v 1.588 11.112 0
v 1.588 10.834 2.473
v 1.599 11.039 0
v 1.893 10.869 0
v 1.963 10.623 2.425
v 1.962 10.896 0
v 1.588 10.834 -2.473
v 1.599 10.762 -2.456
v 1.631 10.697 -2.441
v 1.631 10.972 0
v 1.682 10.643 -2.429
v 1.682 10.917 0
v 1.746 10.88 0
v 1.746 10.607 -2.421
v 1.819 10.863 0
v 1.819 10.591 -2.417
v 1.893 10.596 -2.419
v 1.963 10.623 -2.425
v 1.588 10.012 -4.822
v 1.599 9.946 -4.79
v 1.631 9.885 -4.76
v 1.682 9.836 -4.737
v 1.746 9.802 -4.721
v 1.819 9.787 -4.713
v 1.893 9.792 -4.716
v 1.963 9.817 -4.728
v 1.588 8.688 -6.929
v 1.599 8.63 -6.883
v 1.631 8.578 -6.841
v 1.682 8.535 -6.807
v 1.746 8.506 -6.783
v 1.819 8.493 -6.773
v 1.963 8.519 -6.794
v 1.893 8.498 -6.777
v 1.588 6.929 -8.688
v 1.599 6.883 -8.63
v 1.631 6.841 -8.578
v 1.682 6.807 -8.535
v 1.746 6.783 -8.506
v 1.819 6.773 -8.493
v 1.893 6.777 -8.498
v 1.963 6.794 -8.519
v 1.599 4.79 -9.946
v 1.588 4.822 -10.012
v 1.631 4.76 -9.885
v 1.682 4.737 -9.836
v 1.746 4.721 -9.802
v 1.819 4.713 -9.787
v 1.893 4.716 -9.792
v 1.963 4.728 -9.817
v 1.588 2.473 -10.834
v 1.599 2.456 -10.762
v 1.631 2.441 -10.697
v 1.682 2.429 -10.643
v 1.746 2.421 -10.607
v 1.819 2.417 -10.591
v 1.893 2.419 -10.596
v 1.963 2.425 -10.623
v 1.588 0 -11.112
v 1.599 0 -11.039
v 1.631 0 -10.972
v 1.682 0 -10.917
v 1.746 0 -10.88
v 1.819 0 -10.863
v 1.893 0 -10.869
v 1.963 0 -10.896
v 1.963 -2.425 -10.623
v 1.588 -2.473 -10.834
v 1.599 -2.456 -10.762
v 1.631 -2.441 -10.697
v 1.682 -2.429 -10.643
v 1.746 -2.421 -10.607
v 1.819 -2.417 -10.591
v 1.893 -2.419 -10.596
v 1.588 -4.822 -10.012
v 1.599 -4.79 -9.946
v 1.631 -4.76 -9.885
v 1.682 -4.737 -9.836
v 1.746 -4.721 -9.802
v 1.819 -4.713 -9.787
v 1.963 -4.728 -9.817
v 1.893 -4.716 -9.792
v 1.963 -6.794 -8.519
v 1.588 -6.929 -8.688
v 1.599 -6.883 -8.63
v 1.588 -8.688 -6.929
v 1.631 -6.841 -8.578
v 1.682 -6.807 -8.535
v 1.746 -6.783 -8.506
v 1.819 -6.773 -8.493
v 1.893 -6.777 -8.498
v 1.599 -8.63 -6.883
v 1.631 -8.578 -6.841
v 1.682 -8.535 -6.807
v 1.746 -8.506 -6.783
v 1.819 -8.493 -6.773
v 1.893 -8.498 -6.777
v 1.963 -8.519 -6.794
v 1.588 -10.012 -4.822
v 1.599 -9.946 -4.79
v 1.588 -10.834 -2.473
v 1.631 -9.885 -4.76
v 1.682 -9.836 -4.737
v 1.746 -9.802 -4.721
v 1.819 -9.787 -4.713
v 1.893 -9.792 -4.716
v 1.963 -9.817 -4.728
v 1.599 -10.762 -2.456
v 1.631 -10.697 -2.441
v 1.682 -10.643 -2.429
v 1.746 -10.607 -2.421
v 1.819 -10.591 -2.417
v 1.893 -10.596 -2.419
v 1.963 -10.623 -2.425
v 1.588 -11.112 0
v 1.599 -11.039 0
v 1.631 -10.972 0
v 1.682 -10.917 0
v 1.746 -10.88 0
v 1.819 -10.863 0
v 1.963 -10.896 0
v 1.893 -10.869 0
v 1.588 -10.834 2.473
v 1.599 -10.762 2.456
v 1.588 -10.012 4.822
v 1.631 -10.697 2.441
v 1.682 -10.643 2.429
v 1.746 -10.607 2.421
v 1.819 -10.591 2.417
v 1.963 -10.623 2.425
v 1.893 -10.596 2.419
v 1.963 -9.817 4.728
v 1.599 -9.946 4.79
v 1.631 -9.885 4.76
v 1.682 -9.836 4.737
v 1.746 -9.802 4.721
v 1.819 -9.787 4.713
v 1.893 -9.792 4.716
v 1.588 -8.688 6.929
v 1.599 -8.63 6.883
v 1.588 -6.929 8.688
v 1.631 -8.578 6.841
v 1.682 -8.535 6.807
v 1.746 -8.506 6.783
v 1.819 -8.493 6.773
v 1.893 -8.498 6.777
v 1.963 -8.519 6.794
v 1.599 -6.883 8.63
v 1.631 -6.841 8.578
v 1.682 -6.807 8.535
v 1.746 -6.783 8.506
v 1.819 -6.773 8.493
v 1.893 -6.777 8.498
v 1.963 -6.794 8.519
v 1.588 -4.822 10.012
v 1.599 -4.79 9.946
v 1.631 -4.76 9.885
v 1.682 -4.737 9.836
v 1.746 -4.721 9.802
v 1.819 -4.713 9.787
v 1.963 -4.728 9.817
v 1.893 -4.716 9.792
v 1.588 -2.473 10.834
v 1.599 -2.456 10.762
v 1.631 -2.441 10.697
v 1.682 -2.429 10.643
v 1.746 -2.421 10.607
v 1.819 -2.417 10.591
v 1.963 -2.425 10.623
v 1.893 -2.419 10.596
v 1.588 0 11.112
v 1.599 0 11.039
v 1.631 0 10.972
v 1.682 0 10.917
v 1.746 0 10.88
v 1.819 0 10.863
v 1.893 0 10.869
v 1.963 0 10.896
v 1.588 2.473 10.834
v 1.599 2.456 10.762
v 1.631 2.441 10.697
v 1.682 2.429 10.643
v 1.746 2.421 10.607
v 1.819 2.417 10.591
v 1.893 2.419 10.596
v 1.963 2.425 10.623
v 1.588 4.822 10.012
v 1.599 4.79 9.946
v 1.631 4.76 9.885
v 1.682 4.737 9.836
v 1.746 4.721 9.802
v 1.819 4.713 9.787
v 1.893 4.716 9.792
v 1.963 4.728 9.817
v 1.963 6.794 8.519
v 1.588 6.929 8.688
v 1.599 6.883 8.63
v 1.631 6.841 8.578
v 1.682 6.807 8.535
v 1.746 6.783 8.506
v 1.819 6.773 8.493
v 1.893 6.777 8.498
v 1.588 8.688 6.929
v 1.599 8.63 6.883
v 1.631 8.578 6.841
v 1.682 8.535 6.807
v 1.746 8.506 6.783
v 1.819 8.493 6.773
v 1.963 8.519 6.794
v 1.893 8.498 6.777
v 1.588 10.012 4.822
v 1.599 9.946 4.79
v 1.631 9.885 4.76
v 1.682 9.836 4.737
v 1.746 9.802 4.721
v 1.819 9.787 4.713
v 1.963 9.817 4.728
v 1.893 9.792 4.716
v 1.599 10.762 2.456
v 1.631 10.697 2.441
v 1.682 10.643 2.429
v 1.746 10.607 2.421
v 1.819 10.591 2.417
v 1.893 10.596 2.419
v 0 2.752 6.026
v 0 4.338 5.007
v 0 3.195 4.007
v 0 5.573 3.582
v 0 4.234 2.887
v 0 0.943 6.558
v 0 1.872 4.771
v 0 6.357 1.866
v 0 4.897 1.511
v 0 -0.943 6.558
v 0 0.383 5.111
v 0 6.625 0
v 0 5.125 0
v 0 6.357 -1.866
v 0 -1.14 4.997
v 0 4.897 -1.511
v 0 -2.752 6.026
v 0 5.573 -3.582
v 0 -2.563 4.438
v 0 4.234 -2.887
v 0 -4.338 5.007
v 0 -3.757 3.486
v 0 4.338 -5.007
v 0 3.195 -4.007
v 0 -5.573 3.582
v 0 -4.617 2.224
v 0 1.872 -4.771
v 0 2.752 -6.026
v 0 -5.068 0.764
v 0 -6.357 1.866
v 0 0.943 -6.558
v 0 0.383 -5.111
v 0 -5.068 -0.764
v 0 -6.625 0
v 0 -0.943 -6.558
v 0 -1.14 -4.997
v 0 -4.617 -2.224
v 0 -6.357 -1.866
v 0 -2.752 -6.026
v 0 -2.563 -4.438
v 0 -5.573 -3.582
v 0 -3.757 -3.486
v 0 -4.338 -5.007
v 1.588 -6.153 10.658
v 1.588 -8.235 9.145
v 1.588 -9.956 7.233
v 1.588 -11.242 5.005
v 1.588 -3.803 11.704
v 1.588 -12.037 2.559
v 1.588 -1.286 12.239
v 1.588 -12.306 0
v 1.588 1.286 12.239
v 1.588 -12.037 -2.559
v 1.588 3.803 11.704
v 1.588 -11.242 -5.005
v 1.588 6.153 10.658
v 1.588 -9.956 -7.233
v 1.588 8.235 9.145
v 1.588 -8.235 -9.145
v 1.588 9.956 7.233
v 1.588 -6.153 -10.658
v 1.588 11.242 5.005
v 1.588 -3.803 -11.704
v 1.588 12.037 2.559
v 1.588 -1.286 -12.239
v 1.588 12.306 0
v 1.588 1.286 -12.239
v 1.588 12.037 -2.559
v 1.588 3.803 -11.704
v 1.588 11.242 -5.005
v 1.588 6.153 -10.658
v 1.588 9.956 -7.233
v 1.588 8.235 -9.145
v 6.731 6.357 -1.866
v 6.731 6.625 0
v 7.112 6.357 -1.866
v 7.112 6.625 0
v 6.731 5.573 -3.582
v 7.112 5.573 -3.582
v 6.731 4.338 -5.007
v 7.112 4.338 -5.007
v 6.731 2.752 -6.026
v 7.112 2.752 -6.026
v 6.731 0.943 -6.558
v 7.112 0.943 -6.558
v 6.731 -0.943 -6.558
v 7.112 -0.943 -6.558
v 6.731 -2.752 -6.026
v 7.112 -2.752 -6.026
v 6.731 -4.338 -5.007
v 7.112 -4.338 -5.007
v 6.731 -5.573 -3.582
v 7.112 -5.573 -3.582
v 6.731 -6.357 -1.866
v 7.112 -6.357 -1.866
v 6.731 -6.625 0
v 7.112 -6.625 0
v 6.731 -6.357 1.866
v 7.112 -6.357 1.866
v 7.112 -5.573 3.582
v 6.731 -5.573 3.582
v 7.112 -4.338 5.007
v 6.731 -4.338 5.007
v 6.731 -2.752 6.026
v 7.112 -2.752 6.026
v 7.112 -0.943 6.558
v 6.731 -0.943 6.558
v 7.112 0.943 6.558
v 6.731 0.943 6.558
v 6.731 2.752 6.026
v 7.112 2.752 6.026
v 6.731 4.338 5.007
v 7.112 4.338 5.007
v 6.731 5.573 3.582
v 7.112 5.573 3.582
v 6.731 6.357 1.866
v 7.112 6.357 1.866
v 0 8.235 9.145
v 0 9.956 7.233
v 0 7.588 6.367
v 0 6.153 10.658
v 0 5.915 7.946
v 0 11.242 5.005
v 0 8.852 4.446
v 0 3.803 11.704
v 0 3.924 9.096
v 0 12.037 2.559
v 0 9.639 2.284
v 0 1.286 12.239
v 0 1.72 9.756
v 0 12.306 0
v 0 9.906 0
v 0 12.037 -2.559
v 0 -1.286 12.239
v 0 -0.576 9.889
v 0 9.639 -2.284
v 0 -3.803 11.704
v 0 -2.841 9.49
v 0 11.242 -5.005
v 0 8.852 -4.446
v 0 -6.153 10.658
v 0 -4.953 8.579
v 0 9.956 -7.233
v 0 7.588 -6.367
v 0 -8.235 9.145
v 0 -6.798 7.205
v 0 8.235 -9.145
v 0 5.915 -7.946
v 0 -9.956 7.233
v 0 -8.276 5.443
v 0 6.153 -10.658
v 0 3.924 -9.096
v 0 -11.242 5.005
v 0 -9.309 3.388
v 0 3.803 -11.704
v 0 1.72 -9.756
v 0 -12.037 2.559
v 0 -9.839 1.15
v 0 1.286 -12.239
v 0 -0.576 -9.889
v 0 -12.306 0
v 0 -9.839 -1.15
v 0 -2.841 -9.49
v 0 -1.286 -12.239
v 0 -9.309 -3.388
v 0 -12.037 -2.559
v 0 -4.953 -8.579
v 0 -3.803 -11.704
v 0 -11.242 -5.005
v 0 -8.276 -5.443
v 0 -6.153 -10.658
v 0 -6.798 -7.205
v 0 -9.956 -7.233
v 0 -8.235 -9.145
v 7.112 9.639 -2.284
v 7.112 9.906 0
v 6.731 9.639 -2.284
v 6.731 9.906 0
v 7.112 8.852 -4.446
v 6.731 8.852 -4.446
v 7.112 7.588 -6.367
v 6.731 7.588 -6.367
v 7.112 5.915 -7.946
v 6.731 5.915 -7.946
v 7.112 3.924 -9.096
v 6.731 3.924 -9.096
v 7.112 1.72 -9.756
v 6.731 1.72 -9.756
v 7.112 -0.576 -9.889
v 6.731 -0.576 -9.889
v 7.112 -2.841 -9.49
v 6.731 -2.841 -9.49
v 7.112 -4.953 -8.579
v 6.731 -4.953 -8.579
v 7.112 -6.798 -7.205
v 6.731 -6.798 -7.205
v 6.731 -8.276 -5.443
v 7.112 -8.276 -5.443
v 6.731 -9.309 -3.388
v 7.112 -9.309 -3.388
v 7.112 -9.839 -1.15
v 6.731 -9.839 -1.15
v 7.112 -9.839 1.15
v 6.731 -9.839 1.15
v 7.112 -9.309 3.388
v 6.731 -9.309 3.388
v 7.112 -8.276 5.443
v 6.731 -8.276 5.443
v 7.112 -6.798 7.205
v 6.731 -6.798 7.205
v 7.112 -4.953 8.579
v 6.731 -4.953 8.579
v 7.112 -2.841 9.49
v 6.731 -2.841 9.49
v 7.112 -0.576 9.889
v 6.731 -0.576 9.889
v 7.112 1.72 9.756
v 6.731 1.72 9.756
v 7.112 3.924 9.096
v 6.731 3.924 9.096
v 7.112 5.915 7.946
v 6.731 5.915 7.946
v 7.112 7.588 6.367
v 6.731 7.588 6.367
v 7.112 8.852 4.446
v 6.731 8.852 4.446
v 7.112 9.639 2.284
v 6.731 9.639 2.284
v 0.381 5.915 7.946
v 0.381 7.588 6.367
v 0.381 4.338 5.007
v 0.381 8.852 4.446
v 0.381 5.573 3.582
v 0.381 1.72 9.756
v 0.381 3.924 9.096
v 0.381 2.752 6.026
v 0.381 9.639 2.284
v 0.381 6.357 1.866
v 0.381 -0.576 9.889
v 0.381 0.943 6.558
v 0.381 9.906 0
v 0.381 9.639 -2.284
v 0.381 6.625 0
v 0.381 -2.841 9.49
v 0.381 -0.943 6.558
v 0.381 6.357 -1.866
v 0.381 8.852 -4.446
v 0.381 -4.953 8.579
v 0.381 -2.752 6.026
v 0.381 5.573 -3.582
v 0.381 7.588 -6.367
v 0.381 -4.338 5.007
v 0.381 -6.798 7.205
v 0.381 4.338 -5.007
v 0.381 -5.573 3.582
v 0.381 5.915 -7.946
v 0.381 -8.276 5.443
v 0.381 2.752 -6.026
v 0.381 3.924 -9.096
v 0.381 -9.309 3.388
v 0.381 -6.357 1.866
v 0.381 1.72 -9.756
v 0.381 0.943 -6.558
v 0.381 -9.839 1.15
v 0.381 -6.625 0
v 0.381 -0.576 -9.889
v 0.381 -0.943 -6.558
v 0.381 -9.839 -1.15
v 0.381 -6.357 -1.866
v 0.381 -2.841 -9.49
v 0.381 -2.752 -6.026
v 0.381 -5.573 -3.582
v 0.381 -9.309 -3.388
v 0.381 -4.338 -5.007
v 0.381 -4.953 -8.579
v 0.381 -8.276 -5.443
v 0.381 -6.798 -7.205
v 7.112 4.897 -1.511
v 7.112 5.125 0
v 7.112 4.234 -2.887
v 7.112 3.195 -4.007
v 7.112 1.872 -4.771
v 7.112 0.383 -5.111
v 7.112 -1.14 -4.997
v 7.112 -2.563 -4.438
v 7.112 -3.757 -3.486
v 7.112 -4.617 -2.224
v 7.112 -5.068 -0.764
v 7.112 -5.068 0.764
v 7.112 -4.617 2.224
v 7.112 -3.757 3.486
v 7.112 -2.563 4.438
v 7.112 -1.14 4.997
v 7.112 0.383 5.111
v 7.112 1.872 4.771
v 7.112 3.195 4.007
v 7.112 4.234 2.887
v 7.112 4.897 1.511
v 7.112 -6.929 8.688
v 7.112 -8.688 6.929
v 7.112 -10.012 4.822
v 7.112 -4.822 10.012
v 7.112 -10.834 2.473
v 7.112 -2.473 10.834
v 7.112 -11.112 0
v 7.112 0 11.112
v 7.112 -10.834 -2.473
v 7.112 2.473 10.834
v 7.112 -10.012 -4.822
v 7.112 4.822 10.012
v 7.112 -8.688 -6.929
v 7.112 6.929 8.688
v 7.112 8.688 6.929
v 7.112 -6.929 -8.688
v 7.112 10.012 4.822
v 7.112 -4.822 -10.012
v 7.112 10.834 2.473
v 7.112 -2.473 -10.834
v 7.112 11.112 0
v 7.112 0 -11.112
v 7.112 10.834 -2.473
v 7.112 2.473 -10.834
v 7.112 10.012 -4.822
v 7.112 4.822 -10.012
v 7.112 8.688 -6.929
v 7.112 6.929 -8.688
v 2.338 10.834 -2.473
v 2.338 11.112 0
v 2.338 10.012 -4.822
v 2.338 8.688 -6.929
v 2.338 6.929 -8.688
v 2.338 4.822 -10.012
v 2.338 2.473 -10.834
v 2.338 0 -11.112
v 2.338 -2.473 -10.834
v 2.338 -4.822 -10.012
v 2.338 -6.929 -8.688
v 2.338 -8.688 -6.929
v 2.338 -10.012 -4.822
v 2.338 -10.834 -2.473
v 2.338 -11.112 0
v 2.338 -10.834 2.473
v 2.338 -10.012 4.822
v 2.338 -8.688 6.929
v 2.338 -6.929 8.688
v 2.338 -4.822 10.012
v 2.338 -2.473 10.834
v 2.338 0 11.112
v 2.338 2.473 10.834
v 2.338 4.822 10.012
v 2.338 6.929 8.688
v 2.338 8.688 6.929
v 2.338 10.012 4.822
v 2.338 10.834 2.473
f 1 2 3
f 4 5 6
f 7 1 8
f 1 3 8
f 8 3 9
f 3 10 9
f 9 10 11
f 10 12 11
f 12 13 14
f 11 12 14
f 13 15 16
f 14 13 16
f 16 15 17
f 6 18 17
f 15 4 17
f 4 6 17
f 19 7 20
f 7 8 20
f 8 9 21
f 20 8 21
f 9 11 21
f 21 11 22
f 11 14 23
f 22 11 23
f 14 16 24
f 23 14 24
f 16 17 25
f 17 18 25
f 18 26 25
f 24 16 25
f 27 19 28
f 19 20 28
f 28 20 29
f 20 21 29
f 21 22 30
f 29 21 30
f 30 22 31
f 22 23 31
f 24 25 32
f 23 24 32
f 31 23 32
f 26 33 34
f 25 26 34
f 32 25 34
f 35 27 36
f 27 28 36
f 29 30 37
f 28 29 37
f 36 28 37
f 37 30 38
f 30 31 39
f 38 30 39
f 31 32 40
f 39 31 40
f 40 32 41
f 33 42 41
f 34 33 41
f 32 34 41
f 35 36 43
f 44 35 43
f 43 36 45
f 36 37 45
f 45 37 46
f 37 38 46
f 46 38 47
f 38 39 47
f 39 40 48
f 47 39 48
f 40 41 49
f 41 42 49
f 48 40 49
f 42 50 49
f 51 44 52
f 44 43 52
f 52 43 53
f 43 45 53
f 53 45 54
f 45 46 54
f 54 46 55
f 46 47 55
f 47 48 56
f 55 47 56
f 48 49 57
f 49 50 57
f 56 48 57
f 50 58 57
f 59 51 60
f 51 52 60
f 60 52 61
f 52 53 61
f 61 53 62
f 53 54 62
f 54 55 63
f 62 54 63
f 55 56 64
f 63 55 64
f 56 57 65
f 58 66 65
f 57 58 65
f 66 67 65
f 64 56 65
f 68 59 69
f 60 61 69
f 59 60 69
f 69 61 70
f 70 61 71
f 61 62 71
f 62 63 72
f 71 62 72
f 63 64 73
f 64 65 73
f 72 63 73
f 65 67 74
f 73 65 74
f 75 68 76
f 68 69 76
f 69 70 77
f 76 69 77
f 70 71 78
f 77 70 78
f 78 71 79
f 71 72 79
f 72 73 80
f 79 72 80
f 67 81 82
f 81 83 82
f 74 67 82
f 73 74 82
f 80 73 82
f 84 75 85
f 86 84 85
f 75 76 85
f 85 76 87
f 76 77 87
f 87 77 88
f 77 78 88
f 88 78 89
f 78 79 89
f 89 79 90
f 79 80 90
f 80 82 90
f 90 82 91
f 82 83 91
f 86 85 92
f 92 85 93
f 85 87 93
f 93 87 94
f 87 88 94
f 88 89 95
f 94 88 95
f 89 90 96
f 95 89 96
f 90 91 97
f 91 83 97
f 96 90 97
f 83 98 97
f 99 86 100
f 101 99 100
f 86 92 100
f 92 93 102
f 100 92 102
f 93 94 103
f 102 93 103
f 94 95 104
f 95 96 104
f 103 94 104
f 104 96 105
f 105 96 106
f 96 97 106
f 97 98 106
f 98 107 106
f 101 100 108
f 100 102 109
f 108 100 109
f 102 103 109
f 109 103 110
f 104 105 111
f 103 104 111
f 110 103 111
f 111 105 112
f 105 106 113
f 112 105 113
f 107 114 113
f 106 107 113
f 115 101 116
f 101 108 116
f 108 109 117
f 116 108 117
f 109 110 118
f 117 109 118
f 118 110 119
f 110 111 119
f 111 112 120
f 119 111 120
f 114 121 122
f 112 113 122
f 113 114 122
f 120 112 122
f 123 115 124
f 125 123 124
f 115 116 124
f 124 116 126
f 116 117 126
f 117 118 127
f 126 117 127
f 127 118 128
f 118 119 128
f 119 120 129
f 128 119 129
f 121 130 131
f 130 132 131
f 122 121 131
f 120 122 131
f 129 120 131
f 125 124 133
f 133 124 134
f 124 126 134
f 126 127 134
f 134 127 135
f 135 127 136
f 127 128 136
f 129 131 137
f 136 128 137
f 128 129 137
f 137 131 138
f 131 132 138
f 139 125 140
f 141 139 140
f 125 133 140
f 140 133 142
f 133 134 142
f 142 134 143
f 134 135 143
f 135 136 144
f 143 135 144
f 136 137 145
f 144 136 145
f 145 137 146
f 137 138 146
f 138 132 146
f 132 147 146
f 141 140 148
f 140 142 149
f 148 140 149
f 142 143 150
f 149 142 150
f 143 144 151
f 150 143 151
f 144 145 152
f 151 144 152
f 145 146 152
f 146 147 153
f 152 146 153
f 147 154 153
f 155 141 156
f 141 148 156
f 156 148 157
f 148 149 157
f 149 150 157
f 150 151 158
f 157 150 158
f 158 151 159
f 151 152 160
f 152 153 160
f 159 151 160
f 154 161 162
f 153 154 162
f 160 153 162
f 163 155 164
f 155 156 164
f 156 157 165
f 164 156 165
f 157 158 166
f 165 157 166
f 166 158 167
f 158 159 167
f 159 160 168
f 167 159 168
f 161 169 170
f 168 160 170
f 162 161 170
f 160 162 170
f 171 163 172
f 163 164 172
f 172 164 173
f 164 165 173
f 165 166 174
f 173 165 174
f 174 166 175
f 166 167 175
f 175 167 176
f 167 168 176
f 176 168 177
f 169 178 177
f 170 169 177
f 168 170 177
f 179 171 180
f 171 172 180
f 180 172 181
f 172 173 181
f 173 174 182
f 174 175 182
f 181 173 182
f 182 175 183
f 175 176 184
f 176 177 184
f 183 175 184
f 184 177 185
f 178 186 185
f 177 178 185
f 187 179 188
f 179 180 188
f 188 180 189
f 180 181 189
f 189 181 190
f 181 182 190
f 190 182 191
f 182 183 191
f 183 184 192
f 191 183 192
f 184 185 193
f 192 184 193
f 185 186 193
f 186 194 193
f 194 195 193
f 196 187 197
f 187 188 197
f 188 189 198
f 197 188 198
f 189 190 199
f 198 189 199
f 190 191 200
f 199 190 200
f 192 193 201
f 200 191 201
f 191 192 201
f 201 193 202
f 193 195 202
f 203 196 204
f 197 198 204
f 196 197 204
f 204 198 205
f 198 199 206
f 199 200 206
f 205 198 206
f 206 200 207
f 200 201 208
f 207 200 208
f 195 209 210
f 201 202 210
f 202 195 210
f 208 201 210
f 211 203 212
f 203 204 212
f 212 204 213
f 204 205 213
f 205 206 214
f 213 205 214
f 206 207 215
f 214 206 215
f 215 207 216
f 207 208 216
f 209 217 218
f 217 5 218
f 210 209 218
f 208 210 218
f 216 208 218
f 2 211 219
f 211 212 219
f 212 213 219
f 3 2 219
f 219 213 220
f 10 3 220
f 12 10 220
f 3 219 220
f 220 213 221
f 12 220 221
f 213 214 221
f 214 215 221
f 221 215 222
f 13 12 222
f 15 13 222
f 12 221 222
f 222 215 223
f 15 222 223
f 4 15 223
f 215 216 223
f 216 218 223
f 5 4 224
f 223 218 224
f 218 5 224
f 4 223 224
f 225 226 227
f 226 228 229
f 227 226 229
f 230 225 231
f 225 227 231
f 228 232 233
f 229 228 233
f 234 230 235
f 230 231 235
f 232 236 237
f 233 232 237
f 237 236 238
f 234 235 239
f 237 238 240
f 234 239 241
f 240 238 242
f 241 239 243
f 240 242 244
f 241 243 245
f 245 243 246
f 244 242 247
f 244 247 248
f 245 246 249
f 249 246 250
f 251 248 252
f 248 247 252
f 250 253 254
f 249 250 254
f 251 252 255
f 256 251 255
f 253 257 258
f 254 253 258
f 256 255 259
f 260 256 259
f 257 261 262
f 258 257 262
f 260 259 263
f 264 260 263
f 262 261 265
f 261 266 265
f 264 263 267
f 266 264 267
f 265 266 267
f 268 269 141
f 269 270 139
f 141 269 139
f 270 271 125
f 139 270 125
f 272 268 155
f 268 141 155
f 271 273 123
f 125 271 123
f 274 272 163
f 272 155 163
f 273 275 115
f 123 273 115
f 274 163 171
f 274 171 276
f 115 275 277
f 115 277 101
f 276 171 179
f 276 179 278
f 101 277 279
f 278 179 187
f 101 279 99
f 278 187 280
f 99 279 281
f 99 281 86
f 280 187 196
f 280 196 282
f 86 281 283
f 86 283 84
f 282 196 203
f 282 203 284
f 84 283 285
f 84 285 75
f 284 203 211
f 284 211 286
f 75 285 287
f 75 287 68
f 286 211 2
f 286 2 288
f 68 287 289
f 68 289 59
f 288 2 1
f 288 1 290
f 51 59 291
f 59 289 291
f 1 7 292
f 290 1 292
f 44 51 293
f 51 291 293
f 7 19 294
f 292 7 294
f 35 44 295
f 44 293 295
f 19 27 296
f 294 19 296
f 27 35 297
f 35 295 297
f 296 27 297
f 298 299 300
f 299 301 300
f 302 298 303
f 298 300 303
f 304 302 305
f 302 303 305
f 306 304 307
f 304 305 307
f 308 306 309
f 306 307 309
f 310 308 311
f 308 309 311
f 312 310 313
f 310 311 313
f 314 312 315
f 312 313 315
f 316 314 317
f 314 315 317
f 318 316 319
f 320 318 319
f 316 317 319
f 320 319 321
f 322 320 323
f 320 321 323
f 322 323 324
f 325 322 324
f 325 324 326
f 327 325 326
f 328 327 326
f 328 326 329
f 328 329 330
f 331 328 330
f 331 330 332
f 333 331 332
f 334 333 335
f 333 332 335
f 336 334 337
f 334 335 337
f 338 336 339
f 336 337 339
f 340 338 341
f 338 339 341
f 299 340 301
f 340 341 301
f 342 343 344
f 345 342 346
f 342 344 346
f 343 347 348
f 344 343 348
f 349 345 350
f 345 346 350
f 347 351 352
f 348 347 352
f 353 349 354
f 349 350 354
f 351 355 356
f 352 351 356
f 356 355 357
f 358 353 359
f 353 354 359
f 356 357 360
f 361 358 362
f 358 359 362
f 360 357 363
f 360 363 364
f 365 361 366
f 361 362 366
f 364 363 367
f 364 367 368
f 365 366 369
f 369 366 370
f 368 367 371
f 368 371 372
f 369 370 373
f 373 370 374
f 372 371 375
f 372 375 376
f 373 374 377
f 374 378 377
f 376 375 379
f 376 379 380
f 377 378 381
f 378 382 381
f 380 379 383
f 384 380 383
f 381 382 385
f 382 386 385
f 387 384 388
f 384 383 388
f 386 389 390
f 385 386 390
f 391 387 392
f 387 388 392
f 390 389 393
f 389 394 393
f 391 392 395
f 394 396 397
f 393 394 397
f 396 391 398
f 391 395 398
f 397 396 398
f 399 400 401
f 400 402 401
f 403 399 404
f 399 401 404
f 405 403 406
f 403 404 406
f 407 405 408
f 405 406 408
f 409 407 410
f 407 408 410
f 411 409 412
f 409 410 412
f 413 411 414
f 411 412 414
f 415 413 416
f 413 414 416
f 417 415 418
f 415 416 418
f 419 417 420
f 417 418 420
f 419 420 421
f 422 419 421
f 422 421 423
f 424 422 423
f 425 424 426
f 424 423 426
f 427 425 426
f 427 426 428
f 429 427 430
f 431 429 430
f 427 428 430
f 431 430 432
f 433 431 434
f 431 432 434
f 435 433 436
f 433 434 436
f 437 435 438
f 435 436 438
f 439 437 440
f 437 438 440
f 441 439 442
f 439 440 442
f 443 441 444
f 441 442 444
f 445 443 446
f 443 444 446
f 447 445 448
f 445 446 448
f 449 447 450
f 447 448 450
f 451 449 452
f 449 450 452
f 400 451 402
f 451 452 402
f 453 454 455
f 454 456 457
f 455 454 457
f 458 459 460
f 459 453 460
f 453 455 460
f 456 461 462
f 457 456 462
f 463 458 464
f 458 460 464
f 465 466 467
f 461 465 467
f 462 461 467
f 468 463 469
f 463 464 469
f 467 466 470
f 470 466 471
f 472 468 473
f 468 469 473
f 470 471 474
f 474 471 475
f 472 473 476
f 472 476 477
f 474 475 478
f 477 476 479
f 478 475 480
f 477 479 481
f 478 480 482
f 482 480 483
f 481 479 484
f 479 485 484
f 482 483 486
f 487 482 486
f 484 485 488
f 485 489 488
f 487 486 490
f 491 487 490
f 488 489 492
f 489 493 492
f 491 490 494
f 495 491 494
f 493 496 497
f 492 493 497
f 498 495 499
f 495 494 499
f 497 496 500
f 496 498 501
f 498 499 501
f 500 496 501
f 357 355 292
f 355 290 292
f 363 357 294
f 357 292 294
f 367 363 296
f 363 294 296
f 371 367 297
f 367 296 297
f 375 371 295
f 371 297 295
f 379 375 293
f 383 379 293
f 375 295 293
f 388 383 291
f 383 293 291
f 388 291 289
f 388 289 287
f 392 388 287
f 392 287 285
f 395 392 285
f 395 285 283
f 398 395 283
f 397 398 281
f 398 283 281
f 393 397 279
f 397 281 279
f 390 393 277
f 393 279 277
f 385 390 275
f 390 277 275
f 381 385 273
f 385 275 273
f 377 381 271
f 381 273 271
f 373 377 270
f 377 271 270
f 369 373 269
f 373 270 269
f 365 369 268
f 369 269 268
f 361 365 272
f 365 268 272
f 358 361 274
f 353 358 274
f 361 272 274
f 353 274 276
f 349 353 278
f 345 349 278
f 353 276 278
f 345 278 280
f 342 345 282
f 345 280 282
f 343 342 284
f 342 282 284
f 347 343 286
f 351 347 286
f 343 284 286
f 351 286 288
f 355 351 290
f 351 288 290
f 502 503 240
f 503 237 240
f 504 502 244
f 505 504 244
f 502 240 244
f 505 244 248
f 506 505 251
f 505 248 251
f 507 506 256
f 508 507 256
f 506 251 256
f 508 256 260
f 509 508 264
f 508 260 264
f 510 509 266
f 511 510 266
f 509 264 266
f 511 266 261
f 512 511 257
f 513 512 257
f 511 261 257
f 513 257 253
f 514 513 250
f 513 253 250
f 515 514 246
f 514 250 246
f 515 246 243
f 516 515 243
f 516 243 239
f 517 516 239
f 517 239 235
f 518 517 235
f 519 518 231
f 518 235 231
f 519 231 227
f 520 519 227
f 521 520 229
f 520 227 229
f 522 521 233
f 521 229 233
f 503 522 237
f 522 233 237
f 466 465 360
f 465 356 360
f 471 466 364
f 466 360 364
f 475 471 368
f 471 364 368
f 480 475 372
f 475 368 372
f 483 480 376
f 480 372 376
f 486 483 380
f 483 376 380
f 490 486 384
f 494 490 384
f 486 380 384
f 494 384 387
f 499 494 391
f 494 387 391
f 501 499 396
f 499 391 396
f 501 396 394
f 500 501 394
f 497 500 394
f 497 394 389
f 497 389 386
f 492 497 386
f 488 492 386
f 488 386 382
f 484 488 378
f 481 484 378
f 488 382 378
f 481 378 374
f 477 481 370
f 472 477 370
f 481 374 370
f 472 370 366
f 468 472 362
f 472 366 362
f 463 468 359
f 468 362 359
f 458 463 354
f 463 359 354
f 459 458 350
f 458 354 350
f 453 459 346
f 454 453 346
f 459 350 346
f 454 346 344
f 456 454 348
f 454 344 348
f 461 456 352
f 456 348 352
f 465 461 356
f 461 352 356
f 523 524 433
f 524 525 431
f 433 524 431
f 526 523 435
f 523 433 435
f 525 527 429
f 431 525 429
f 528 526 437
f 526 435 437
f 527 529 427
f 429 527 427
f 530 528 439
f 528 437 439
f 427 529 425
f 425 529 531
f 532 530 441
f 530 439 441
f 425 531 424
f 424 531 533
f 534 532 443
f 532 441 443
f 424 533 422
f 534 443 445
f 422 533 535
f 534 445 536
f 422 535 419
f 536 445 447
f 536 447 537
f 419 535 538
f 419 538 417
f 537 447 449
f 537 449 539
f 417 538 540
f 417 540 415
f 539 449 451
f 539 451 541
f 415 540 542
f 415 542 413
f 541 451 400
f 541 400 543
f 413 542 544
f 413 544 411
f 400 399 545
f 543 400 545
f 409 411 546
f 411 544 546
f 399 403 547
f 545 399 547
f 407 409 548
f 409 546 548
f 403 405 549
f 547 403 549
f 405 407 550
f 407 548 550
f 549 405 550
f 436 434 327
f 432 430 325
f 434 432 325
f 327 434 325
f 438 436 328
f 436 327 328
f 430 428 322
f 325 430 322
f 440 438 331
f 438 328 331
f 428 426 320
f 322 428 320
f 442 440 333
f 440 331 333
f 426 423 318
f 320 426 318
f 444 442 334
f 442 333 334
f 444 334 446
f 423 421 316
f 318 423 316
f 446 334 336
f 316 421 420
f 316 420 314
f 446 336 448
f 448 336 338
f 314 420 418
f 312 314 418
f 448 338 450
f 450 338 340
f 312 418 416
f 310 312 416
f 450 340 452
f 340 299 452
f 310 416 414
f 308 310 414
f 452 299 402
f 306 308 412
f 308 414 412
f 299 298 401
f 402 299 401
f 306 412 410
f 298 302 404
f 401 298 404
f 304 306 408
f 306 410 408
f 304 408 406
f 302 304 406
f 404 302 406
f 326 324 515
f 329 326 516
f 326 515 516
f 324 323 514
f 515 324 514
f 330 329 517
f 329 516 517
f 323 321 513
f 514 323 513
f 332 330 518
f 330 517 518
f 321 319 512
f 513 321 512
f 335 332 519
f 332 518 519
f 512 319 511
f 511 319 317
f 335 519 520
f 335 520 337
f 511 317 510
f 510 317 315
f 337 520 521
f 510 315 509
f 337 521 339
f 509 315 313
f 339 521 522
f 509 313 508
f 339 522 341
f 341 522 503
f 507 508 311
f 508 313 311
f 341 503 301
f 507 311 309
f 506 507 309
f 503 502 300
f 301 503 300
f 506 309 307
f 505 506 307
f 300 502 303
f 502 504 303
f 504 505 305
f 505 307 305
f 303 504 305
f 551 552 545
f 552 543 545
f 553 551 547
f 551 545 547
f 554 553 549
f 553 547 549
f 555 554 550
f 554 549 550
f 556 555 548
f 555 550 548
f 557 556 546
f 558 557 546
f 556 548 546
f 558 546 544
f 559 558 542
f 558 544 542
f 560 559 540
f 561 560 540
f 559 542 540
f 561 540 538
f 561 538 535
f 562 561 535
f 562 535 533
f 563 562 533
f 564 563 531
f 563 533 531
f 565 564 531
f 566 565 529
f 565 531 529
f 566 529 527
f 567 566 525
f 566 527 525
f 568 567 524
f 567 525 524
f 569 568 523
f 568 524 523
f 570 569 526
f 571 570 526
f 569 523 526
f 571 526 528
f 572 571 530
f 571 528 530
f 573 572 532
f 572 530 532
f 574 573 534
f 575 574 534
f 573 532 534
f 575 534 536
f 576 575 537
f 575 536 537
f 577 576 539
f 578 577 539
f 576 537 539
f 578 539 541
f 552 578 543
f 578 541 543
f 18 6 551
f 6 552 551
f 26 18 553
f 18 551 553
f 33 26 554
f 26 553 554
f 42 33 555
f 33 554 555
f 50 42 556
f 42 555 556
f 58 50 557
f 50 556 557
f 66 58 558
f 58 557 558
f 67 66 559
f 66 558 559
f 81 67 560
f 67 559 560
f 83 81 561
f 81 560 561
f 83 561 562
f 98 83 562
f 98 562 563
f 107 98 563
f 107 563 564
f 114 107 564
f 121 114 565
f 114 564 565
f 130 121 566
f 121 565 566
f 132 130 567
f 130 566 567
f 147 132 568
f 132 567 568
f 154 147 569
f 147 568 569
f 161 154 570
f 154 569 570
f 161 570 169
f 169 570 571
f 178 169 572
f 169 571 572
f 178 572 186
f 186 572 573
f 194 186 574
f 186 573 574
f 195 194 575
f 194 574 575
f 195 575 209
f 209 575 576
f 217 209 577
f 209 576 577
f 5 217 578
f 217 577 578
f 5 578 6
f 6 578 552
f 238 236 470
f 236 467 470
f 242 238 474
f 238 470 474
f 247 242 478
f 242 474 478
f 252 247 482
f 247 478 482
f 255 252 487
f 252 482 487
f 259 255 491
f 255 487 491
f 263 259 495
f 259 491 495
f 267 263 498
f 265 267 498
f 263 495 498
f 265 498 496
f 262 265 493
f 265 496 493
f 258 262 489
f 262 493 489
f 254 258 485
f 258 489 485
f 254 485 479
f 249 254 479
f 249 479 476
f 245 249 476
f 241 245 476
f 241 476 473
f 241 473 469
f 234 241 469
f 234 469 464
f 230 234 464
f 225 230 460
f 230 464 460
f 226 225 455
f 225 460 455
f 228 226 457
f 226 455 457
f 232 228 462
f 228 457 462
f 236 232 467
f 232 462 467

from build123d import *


with BuildPart() as part:
    # Sketch1 → Revolve1 (revolve)
    with BuildSketch(Plane(origin=(0, 0, 0), x_dir=(-1, 0, 0), z_dir=(0, 0, -1))):
        with BuildLine():
            Line((-2.3375, 11.1125), (-7.112, 11.1125))
            Line((-7.112, 11.1125), (-7.112, 9.906))
            Line((-7.112, 9.906), (-6.731, 9.906))
            Line((-6.731, 9.906), (-6.731, 6.625))
            Line((-6.731, 6.625), (-7.112, 6.625))
            Line((-7.112, 6.625), (-7.112, 5.125))
            Line((-7.112, 5.125), (0, 5.125))
            Line((0, 5.125), (0, 6.625))
            Line((0, 6.625), (-0.381, 6.625))
            Line((-0.381, 6.625), (-0.381, 9.906))
            Line((-0.381, 9.906), (0, 9.906))
            Line((0, 9.906), (0, 12.3063))
            Line((0, 12.3063), (-1.5875, 12.3063))
            Line((-1.5875, 12.3063), (-1.5875, 11.1125))
            ThreePointArc((-1.5875, 11.1125), (-1.7125, 10.895993649), (-1.9625, 10.895993649))
            Line((-1.9625, 10.895993649), (-2.3375, 11.1125))
        make_face()
    revolve(axis=Axis((7.112, 0, 0), (-1, 0, 0)))


solid = part.part
